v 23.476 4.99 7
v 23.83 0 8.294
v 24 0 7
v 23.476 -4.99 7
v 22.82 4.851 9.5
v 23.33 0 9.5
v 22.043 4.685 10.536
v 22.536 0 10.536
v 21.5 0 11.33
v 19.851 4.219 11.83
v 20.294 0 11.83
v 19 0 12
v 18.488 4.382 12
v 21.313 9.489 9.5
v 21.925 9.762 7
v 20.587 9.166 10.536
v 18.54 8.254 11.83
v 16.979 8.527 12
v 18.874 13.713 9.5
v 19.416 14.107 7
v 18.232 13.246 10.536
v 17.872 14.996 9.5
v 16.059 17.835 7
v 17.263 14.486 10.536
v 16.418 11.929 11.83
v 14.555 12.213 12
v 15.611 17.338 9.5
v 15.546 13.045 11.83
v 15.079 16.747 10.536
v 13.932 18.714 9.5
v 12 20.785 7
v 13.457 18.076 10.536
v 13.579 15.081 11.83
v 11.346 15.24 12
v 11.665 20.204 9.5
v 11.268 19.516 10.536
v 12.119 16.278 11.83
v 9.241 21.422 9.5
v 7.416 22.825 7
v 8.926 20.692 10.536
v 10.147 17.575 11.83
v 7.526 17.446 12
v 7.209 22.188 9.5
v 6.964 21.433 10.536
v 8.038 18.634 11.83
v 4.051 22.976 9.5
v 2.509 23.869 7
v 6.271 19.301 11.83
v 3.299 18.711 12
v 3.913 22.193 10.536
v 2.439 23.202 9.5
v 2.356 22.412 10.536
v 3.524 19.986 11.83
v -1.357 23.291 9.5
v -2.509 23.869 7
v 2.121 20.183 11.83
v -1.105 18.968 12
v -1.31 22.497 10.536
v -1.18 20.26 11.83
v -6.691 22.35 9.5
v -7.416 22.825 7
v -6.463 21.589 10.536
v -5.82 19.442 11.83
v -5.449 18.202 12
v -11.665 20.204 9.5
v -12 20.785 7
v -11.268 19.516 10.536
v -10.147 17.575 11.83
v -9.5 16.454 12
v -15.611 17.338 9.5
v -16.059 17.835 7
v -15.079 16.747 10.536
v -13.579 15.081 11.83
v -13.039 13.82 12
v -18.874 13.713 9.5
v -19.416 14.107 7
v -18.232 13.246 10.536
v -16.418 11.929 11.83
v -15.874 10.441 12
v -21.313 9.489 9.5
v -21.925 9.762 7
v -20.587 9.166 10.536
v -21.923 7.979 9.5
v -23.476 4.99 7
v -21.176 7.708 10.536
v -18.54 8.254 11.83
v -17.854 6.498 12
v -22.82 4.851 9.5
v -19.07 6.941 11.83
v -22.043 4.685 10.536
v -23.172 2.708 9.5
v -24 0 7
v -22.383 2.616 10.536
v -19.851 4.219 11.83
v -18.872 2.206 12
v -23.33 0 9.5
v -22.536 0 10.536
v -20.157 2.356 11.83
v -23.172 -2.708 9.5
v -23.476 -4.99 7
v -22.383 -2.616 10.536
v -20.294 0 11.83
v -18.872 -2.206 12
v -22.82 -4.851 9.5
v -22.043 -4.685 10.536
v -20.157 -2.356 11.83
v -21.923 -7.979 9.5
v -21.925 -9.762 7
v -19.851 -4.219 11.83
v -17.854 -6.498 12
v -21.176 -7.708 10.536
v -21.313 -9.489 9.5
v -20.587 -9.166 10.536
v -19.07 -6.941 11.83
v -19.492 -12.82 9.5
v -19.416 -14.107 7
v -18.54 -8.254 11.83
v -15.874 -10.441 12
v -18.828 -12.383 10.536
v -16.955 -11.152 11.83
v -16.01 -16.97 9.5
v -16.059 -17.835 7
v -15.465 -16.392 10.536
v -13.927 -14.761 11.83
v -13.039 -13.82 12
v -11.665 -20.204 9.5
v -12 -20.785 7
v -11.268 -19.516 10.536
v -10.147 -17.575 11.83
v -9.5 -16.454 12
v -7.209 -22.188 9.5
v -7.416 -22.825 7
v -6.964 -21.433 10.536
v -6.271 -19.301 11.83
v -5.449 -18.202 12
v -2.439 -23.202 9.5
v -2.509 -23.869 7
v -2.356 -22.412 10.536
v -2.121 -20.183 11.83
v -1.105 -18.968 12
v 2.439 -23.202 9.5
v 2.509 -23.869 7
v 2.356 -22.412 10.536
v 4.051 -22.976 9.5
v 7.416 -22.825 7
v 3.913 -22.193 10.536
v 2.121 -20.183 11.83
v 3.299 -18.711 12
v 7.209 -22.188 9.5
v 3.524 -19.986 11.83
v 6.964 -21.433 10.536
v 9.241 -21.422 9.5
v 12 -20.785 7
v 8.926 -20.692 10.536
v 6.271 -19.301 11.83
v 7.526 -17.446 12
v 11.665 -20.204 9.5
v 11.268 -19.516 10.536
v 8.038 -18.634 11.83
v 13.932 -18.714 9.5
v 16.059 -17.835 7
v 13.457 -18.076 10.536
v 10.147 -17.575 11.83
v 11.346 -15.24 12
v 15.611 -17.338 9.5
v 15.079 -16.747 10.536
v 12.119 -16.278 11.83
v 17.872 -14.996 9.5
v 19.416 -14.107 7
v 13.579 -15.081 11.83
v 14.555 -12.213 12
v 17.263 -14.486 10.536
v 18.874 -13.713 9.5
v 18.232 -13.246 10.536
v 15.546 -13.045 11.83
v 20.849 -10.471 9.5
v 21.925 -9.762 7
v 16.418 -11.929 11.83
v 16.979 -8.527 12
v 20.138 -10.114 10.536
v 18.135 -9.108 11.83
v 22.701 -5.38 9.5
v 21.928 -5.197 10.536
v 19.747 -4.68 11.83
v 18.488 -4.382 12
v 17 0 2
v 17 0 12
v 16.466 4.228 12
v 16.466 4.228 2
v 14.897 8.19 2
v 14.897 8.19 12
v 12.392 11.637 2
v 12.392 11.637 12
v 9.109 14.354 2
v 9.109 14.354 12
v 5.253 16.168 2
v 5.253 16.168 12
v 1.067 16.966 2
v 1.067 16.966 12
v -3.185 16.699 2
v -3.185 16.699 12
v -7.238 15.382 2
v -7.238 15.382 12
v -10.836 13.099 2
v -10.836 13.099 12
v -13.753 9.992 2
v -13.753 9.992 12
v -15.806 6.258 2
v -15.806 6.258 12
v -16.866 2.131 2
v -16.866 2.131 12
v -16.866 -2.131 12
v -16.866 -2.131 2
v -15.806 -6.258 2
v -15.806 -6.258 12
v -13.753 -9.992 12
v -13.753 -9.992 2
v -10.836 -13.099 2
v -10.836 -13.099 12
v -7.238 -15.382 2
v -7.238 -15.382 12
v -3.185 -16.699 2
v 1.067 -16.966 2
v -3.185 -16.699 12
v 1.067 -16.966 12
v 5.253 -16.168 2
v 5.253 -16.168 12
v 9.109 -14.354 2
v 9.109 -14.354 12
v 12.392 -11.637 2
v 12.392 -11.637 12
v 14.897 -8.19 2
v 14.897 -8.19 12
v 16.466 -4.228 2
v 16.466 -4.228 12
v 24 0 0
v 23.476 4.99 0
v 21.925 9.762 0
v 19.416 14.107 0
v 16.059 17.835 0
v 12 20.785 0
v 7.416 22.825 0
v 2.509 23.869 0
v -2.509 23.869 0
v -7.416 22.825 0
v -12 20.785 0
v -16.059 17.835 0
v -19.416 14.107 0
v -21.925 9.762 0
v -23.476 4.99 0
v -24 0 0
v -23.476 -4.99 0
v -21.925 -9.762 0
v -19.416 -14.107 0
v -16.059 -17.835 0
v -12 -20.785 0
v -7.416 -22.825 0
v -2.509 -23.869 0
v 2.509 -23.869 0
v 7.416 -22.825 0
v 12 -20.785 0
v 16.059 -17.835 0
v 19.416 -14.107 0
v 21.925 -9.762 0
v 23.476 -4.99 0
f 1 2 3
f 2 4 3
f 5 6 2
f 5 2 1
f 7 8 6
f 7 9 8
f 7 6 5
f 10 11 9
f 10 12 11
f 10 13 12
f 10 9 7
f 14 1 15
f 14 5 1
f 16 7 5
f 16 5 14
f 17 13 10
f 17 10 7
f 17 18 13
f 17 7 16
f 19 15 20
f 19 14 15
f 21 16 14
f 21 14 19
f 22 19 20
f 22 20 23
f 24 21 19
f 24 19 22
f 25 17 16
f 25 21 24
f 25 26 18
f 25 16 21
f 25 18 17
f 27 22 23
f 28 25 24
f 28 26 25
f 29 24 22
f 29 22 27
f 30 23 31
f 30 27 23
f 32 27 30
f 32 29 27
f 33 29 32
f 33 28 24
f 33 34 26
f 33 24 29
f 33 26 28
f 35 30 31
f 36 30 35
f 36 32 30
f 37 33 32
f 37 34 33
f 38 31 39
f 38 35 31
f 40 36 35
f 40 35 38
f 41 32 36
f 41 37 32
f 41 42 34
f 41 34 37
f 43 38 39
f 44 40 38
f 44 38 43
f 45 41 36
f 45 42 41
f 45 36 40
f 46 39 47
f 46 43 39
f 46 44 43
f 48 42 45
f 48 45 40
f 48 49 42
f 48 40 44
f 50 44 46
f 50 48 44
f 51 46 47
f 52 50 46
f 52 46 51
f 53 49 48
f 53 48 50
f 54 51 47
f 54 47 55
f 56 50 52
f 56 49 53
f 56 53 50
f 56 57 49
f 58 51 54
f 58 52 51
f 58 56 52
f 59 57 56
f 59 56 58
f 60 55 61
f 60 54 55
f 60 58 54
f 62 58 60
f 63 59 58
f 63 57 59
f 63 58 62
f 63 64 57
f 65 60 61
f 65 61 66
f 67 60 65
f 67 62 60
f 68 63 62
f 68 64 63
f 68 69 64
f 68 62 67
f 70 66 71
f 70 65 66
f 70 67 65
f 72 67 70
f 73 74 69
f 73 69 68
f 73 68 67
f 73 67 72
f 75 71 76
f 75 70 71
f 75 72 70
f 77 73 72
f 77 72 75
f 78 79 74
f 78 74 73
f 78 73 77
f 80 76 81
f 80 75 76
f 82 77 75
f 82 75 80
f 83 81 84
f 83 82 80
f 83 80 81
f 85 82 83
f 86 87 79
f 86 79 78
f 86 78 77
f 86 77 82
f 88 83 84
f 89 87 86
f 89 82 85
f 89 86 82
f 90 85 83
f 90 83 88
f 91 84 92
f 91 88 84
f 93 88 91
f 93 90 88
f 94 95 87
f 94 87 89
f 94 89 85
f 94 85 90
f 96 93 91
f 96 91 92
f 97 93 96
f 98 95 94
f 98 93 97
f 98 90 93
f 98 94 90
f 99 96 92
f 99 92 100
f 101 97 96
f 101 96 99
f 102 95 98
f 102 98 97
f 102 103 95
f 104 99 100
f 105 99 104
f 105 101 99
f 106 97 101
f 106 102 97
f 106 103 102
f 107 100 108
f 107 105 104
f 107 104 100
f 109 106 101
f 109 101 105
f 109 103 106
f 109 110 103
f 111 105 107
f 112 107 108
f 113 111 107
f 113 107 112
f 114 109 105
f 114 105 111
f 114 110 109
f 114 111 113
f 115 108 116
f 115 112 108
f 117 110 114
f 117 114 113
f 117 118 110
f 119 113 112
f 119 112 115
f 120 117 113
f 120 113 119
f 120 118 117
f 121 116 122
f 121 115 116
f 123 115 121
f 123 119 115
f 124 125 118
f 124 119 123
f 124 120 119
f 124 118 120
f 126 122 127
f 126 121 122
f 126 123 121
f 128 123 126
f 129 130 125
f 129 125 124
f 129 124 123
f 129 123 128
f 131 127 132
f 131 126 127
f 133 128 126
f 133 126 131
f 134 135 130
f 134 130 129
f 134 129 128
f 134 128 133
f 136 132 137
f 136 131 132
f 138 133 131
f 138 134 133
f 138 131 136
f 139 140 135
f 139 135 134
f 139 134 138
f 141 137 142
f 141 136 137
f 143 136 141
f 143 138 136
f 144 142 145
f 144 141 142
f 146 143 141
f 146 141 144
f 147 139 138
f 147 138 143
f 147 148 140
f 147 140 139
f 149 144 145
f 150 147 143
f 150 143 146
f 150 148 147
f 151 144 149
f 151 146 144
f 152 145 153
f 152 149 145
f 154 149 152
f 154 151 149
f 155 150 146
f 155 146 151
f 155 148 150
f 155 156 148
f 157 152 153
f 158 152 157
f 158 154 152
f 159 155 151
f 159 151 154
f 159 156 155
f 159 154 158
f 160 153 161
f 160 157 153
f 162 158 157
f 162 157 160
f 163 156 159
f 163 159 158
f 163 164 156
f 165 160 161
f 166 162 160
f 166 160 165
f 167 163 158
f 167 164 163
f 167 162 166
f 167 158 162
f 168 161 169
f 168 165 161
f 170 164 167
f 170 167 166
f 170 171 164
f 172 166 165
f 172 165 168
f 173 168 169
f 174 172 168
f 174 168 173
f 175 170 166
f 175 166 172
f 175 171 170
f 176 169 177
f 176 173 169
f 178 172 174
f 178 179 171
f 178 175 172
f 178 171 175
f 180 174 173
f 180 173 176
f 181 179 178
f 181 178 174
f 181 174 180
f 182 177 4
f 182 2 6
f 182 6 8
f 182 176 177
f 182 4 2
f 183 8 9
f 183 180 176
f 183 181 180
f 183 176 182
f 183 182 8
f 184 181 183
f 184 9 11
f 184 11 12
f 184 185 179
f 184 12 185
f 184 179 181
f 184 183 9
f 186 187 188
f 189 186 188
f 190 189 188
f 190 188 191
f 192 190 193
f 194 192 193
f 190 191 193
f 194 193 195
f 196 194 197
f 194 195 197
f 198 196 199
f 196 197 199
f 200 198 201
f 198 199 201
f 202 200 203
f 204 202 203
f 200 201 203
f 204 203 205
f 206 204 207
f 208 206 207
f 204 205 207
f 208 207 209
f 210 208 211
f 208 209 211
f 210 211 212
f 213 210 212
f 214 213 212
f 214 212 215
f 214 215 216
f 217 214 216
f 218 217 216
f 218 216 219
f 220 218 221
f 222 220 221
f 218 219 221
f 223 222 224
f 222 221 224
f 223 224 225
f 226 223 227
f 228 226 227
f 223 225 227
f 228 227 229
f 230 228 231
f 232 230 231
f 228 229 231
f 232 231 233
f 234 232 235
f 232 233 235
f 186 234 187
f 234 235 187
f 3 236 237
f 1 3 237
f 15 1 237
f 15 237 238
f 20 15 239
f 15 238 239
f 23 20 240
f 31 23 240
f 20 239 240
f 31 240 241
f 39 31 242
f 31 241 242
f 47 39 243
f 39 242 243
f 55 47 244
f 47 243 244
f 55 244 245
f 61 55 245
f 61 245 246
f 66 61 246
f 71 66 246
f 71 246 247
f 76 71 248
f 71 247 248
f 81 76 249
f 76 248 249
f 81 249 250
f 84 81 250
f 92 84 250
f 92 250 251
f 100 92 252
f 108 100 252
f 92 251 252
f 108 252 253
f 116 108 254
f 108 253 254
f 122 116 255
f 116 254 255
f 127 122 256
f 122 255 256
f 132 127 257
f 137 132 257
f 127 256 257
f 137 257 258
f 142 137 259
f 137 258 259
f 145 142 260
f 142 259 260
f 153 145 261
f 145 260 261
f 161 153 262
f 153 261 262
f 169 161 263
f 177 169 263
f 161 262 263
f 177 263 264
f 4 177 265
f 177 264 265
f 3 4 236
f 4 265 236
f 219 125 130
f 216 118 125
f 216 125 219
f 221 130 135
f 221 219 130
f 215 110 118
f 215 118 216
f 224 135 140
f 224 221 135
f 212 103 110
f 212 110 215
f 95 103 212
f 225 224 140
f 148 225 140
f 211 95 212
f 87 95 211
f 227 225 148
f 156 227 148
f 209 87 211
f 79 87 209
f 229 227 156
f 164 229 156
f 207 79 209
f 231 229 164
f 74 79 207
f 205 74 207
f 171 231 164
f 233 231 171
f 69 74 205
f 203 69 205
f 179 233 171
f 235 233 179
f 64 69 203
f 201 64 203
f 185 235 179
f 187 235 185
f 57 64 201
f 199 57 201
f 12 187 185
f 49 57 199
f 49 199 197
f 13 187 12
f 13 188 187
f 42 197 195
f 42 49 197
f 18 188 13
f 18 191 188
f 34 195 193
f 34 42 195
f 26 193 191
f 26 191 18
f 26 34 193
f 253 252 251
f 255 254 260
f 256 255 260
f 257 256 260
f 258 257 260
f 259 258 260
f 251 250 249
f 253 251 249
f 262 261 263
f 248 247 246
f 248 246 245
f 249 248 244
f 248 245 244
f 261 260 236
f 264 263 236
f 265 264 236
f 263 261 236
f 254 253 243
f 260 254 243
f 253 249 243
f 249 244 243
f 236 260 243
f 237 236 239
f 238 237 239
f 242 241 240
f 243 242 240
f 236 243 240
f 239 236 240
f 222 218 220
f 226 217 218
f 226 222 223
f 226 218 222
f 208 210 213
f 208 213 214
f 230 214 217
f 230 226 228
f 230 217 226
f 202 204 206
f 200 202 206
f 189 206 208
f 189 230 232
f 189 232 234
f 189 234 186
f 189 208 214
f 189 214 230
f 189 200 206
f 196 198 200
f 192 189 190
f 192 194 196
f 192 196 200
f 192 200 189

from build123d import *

# Parameters (mm, degrees)
F0_R     = 24
F1_DEPTH = 12
F2_R     = 5
F3_R     = 17
F4_DEPTH = 10


with BuildPart() as f1:
    # F0 (on Top) → F1 (new body)
    with BuildSketch(Plane.XY):
        Circle(F0_R)
    extrude(amount=F1_DEPTH)

    # F2
    f2_edges = [f1.edges().sort_by_distance(p)[0] for p in [
        (-24, 0, 12),
    ]]
    fillet(f2_edges, radius=F2_R)

    # F3 (on face) → F4 (cut)
    with BuildSketch(Plane.XY.offset(12)):
        Circle(F3_R)
    extrude(amount=-F4_DEPTH, mode=Mode.SUBTRACT)


solid = f1.part
